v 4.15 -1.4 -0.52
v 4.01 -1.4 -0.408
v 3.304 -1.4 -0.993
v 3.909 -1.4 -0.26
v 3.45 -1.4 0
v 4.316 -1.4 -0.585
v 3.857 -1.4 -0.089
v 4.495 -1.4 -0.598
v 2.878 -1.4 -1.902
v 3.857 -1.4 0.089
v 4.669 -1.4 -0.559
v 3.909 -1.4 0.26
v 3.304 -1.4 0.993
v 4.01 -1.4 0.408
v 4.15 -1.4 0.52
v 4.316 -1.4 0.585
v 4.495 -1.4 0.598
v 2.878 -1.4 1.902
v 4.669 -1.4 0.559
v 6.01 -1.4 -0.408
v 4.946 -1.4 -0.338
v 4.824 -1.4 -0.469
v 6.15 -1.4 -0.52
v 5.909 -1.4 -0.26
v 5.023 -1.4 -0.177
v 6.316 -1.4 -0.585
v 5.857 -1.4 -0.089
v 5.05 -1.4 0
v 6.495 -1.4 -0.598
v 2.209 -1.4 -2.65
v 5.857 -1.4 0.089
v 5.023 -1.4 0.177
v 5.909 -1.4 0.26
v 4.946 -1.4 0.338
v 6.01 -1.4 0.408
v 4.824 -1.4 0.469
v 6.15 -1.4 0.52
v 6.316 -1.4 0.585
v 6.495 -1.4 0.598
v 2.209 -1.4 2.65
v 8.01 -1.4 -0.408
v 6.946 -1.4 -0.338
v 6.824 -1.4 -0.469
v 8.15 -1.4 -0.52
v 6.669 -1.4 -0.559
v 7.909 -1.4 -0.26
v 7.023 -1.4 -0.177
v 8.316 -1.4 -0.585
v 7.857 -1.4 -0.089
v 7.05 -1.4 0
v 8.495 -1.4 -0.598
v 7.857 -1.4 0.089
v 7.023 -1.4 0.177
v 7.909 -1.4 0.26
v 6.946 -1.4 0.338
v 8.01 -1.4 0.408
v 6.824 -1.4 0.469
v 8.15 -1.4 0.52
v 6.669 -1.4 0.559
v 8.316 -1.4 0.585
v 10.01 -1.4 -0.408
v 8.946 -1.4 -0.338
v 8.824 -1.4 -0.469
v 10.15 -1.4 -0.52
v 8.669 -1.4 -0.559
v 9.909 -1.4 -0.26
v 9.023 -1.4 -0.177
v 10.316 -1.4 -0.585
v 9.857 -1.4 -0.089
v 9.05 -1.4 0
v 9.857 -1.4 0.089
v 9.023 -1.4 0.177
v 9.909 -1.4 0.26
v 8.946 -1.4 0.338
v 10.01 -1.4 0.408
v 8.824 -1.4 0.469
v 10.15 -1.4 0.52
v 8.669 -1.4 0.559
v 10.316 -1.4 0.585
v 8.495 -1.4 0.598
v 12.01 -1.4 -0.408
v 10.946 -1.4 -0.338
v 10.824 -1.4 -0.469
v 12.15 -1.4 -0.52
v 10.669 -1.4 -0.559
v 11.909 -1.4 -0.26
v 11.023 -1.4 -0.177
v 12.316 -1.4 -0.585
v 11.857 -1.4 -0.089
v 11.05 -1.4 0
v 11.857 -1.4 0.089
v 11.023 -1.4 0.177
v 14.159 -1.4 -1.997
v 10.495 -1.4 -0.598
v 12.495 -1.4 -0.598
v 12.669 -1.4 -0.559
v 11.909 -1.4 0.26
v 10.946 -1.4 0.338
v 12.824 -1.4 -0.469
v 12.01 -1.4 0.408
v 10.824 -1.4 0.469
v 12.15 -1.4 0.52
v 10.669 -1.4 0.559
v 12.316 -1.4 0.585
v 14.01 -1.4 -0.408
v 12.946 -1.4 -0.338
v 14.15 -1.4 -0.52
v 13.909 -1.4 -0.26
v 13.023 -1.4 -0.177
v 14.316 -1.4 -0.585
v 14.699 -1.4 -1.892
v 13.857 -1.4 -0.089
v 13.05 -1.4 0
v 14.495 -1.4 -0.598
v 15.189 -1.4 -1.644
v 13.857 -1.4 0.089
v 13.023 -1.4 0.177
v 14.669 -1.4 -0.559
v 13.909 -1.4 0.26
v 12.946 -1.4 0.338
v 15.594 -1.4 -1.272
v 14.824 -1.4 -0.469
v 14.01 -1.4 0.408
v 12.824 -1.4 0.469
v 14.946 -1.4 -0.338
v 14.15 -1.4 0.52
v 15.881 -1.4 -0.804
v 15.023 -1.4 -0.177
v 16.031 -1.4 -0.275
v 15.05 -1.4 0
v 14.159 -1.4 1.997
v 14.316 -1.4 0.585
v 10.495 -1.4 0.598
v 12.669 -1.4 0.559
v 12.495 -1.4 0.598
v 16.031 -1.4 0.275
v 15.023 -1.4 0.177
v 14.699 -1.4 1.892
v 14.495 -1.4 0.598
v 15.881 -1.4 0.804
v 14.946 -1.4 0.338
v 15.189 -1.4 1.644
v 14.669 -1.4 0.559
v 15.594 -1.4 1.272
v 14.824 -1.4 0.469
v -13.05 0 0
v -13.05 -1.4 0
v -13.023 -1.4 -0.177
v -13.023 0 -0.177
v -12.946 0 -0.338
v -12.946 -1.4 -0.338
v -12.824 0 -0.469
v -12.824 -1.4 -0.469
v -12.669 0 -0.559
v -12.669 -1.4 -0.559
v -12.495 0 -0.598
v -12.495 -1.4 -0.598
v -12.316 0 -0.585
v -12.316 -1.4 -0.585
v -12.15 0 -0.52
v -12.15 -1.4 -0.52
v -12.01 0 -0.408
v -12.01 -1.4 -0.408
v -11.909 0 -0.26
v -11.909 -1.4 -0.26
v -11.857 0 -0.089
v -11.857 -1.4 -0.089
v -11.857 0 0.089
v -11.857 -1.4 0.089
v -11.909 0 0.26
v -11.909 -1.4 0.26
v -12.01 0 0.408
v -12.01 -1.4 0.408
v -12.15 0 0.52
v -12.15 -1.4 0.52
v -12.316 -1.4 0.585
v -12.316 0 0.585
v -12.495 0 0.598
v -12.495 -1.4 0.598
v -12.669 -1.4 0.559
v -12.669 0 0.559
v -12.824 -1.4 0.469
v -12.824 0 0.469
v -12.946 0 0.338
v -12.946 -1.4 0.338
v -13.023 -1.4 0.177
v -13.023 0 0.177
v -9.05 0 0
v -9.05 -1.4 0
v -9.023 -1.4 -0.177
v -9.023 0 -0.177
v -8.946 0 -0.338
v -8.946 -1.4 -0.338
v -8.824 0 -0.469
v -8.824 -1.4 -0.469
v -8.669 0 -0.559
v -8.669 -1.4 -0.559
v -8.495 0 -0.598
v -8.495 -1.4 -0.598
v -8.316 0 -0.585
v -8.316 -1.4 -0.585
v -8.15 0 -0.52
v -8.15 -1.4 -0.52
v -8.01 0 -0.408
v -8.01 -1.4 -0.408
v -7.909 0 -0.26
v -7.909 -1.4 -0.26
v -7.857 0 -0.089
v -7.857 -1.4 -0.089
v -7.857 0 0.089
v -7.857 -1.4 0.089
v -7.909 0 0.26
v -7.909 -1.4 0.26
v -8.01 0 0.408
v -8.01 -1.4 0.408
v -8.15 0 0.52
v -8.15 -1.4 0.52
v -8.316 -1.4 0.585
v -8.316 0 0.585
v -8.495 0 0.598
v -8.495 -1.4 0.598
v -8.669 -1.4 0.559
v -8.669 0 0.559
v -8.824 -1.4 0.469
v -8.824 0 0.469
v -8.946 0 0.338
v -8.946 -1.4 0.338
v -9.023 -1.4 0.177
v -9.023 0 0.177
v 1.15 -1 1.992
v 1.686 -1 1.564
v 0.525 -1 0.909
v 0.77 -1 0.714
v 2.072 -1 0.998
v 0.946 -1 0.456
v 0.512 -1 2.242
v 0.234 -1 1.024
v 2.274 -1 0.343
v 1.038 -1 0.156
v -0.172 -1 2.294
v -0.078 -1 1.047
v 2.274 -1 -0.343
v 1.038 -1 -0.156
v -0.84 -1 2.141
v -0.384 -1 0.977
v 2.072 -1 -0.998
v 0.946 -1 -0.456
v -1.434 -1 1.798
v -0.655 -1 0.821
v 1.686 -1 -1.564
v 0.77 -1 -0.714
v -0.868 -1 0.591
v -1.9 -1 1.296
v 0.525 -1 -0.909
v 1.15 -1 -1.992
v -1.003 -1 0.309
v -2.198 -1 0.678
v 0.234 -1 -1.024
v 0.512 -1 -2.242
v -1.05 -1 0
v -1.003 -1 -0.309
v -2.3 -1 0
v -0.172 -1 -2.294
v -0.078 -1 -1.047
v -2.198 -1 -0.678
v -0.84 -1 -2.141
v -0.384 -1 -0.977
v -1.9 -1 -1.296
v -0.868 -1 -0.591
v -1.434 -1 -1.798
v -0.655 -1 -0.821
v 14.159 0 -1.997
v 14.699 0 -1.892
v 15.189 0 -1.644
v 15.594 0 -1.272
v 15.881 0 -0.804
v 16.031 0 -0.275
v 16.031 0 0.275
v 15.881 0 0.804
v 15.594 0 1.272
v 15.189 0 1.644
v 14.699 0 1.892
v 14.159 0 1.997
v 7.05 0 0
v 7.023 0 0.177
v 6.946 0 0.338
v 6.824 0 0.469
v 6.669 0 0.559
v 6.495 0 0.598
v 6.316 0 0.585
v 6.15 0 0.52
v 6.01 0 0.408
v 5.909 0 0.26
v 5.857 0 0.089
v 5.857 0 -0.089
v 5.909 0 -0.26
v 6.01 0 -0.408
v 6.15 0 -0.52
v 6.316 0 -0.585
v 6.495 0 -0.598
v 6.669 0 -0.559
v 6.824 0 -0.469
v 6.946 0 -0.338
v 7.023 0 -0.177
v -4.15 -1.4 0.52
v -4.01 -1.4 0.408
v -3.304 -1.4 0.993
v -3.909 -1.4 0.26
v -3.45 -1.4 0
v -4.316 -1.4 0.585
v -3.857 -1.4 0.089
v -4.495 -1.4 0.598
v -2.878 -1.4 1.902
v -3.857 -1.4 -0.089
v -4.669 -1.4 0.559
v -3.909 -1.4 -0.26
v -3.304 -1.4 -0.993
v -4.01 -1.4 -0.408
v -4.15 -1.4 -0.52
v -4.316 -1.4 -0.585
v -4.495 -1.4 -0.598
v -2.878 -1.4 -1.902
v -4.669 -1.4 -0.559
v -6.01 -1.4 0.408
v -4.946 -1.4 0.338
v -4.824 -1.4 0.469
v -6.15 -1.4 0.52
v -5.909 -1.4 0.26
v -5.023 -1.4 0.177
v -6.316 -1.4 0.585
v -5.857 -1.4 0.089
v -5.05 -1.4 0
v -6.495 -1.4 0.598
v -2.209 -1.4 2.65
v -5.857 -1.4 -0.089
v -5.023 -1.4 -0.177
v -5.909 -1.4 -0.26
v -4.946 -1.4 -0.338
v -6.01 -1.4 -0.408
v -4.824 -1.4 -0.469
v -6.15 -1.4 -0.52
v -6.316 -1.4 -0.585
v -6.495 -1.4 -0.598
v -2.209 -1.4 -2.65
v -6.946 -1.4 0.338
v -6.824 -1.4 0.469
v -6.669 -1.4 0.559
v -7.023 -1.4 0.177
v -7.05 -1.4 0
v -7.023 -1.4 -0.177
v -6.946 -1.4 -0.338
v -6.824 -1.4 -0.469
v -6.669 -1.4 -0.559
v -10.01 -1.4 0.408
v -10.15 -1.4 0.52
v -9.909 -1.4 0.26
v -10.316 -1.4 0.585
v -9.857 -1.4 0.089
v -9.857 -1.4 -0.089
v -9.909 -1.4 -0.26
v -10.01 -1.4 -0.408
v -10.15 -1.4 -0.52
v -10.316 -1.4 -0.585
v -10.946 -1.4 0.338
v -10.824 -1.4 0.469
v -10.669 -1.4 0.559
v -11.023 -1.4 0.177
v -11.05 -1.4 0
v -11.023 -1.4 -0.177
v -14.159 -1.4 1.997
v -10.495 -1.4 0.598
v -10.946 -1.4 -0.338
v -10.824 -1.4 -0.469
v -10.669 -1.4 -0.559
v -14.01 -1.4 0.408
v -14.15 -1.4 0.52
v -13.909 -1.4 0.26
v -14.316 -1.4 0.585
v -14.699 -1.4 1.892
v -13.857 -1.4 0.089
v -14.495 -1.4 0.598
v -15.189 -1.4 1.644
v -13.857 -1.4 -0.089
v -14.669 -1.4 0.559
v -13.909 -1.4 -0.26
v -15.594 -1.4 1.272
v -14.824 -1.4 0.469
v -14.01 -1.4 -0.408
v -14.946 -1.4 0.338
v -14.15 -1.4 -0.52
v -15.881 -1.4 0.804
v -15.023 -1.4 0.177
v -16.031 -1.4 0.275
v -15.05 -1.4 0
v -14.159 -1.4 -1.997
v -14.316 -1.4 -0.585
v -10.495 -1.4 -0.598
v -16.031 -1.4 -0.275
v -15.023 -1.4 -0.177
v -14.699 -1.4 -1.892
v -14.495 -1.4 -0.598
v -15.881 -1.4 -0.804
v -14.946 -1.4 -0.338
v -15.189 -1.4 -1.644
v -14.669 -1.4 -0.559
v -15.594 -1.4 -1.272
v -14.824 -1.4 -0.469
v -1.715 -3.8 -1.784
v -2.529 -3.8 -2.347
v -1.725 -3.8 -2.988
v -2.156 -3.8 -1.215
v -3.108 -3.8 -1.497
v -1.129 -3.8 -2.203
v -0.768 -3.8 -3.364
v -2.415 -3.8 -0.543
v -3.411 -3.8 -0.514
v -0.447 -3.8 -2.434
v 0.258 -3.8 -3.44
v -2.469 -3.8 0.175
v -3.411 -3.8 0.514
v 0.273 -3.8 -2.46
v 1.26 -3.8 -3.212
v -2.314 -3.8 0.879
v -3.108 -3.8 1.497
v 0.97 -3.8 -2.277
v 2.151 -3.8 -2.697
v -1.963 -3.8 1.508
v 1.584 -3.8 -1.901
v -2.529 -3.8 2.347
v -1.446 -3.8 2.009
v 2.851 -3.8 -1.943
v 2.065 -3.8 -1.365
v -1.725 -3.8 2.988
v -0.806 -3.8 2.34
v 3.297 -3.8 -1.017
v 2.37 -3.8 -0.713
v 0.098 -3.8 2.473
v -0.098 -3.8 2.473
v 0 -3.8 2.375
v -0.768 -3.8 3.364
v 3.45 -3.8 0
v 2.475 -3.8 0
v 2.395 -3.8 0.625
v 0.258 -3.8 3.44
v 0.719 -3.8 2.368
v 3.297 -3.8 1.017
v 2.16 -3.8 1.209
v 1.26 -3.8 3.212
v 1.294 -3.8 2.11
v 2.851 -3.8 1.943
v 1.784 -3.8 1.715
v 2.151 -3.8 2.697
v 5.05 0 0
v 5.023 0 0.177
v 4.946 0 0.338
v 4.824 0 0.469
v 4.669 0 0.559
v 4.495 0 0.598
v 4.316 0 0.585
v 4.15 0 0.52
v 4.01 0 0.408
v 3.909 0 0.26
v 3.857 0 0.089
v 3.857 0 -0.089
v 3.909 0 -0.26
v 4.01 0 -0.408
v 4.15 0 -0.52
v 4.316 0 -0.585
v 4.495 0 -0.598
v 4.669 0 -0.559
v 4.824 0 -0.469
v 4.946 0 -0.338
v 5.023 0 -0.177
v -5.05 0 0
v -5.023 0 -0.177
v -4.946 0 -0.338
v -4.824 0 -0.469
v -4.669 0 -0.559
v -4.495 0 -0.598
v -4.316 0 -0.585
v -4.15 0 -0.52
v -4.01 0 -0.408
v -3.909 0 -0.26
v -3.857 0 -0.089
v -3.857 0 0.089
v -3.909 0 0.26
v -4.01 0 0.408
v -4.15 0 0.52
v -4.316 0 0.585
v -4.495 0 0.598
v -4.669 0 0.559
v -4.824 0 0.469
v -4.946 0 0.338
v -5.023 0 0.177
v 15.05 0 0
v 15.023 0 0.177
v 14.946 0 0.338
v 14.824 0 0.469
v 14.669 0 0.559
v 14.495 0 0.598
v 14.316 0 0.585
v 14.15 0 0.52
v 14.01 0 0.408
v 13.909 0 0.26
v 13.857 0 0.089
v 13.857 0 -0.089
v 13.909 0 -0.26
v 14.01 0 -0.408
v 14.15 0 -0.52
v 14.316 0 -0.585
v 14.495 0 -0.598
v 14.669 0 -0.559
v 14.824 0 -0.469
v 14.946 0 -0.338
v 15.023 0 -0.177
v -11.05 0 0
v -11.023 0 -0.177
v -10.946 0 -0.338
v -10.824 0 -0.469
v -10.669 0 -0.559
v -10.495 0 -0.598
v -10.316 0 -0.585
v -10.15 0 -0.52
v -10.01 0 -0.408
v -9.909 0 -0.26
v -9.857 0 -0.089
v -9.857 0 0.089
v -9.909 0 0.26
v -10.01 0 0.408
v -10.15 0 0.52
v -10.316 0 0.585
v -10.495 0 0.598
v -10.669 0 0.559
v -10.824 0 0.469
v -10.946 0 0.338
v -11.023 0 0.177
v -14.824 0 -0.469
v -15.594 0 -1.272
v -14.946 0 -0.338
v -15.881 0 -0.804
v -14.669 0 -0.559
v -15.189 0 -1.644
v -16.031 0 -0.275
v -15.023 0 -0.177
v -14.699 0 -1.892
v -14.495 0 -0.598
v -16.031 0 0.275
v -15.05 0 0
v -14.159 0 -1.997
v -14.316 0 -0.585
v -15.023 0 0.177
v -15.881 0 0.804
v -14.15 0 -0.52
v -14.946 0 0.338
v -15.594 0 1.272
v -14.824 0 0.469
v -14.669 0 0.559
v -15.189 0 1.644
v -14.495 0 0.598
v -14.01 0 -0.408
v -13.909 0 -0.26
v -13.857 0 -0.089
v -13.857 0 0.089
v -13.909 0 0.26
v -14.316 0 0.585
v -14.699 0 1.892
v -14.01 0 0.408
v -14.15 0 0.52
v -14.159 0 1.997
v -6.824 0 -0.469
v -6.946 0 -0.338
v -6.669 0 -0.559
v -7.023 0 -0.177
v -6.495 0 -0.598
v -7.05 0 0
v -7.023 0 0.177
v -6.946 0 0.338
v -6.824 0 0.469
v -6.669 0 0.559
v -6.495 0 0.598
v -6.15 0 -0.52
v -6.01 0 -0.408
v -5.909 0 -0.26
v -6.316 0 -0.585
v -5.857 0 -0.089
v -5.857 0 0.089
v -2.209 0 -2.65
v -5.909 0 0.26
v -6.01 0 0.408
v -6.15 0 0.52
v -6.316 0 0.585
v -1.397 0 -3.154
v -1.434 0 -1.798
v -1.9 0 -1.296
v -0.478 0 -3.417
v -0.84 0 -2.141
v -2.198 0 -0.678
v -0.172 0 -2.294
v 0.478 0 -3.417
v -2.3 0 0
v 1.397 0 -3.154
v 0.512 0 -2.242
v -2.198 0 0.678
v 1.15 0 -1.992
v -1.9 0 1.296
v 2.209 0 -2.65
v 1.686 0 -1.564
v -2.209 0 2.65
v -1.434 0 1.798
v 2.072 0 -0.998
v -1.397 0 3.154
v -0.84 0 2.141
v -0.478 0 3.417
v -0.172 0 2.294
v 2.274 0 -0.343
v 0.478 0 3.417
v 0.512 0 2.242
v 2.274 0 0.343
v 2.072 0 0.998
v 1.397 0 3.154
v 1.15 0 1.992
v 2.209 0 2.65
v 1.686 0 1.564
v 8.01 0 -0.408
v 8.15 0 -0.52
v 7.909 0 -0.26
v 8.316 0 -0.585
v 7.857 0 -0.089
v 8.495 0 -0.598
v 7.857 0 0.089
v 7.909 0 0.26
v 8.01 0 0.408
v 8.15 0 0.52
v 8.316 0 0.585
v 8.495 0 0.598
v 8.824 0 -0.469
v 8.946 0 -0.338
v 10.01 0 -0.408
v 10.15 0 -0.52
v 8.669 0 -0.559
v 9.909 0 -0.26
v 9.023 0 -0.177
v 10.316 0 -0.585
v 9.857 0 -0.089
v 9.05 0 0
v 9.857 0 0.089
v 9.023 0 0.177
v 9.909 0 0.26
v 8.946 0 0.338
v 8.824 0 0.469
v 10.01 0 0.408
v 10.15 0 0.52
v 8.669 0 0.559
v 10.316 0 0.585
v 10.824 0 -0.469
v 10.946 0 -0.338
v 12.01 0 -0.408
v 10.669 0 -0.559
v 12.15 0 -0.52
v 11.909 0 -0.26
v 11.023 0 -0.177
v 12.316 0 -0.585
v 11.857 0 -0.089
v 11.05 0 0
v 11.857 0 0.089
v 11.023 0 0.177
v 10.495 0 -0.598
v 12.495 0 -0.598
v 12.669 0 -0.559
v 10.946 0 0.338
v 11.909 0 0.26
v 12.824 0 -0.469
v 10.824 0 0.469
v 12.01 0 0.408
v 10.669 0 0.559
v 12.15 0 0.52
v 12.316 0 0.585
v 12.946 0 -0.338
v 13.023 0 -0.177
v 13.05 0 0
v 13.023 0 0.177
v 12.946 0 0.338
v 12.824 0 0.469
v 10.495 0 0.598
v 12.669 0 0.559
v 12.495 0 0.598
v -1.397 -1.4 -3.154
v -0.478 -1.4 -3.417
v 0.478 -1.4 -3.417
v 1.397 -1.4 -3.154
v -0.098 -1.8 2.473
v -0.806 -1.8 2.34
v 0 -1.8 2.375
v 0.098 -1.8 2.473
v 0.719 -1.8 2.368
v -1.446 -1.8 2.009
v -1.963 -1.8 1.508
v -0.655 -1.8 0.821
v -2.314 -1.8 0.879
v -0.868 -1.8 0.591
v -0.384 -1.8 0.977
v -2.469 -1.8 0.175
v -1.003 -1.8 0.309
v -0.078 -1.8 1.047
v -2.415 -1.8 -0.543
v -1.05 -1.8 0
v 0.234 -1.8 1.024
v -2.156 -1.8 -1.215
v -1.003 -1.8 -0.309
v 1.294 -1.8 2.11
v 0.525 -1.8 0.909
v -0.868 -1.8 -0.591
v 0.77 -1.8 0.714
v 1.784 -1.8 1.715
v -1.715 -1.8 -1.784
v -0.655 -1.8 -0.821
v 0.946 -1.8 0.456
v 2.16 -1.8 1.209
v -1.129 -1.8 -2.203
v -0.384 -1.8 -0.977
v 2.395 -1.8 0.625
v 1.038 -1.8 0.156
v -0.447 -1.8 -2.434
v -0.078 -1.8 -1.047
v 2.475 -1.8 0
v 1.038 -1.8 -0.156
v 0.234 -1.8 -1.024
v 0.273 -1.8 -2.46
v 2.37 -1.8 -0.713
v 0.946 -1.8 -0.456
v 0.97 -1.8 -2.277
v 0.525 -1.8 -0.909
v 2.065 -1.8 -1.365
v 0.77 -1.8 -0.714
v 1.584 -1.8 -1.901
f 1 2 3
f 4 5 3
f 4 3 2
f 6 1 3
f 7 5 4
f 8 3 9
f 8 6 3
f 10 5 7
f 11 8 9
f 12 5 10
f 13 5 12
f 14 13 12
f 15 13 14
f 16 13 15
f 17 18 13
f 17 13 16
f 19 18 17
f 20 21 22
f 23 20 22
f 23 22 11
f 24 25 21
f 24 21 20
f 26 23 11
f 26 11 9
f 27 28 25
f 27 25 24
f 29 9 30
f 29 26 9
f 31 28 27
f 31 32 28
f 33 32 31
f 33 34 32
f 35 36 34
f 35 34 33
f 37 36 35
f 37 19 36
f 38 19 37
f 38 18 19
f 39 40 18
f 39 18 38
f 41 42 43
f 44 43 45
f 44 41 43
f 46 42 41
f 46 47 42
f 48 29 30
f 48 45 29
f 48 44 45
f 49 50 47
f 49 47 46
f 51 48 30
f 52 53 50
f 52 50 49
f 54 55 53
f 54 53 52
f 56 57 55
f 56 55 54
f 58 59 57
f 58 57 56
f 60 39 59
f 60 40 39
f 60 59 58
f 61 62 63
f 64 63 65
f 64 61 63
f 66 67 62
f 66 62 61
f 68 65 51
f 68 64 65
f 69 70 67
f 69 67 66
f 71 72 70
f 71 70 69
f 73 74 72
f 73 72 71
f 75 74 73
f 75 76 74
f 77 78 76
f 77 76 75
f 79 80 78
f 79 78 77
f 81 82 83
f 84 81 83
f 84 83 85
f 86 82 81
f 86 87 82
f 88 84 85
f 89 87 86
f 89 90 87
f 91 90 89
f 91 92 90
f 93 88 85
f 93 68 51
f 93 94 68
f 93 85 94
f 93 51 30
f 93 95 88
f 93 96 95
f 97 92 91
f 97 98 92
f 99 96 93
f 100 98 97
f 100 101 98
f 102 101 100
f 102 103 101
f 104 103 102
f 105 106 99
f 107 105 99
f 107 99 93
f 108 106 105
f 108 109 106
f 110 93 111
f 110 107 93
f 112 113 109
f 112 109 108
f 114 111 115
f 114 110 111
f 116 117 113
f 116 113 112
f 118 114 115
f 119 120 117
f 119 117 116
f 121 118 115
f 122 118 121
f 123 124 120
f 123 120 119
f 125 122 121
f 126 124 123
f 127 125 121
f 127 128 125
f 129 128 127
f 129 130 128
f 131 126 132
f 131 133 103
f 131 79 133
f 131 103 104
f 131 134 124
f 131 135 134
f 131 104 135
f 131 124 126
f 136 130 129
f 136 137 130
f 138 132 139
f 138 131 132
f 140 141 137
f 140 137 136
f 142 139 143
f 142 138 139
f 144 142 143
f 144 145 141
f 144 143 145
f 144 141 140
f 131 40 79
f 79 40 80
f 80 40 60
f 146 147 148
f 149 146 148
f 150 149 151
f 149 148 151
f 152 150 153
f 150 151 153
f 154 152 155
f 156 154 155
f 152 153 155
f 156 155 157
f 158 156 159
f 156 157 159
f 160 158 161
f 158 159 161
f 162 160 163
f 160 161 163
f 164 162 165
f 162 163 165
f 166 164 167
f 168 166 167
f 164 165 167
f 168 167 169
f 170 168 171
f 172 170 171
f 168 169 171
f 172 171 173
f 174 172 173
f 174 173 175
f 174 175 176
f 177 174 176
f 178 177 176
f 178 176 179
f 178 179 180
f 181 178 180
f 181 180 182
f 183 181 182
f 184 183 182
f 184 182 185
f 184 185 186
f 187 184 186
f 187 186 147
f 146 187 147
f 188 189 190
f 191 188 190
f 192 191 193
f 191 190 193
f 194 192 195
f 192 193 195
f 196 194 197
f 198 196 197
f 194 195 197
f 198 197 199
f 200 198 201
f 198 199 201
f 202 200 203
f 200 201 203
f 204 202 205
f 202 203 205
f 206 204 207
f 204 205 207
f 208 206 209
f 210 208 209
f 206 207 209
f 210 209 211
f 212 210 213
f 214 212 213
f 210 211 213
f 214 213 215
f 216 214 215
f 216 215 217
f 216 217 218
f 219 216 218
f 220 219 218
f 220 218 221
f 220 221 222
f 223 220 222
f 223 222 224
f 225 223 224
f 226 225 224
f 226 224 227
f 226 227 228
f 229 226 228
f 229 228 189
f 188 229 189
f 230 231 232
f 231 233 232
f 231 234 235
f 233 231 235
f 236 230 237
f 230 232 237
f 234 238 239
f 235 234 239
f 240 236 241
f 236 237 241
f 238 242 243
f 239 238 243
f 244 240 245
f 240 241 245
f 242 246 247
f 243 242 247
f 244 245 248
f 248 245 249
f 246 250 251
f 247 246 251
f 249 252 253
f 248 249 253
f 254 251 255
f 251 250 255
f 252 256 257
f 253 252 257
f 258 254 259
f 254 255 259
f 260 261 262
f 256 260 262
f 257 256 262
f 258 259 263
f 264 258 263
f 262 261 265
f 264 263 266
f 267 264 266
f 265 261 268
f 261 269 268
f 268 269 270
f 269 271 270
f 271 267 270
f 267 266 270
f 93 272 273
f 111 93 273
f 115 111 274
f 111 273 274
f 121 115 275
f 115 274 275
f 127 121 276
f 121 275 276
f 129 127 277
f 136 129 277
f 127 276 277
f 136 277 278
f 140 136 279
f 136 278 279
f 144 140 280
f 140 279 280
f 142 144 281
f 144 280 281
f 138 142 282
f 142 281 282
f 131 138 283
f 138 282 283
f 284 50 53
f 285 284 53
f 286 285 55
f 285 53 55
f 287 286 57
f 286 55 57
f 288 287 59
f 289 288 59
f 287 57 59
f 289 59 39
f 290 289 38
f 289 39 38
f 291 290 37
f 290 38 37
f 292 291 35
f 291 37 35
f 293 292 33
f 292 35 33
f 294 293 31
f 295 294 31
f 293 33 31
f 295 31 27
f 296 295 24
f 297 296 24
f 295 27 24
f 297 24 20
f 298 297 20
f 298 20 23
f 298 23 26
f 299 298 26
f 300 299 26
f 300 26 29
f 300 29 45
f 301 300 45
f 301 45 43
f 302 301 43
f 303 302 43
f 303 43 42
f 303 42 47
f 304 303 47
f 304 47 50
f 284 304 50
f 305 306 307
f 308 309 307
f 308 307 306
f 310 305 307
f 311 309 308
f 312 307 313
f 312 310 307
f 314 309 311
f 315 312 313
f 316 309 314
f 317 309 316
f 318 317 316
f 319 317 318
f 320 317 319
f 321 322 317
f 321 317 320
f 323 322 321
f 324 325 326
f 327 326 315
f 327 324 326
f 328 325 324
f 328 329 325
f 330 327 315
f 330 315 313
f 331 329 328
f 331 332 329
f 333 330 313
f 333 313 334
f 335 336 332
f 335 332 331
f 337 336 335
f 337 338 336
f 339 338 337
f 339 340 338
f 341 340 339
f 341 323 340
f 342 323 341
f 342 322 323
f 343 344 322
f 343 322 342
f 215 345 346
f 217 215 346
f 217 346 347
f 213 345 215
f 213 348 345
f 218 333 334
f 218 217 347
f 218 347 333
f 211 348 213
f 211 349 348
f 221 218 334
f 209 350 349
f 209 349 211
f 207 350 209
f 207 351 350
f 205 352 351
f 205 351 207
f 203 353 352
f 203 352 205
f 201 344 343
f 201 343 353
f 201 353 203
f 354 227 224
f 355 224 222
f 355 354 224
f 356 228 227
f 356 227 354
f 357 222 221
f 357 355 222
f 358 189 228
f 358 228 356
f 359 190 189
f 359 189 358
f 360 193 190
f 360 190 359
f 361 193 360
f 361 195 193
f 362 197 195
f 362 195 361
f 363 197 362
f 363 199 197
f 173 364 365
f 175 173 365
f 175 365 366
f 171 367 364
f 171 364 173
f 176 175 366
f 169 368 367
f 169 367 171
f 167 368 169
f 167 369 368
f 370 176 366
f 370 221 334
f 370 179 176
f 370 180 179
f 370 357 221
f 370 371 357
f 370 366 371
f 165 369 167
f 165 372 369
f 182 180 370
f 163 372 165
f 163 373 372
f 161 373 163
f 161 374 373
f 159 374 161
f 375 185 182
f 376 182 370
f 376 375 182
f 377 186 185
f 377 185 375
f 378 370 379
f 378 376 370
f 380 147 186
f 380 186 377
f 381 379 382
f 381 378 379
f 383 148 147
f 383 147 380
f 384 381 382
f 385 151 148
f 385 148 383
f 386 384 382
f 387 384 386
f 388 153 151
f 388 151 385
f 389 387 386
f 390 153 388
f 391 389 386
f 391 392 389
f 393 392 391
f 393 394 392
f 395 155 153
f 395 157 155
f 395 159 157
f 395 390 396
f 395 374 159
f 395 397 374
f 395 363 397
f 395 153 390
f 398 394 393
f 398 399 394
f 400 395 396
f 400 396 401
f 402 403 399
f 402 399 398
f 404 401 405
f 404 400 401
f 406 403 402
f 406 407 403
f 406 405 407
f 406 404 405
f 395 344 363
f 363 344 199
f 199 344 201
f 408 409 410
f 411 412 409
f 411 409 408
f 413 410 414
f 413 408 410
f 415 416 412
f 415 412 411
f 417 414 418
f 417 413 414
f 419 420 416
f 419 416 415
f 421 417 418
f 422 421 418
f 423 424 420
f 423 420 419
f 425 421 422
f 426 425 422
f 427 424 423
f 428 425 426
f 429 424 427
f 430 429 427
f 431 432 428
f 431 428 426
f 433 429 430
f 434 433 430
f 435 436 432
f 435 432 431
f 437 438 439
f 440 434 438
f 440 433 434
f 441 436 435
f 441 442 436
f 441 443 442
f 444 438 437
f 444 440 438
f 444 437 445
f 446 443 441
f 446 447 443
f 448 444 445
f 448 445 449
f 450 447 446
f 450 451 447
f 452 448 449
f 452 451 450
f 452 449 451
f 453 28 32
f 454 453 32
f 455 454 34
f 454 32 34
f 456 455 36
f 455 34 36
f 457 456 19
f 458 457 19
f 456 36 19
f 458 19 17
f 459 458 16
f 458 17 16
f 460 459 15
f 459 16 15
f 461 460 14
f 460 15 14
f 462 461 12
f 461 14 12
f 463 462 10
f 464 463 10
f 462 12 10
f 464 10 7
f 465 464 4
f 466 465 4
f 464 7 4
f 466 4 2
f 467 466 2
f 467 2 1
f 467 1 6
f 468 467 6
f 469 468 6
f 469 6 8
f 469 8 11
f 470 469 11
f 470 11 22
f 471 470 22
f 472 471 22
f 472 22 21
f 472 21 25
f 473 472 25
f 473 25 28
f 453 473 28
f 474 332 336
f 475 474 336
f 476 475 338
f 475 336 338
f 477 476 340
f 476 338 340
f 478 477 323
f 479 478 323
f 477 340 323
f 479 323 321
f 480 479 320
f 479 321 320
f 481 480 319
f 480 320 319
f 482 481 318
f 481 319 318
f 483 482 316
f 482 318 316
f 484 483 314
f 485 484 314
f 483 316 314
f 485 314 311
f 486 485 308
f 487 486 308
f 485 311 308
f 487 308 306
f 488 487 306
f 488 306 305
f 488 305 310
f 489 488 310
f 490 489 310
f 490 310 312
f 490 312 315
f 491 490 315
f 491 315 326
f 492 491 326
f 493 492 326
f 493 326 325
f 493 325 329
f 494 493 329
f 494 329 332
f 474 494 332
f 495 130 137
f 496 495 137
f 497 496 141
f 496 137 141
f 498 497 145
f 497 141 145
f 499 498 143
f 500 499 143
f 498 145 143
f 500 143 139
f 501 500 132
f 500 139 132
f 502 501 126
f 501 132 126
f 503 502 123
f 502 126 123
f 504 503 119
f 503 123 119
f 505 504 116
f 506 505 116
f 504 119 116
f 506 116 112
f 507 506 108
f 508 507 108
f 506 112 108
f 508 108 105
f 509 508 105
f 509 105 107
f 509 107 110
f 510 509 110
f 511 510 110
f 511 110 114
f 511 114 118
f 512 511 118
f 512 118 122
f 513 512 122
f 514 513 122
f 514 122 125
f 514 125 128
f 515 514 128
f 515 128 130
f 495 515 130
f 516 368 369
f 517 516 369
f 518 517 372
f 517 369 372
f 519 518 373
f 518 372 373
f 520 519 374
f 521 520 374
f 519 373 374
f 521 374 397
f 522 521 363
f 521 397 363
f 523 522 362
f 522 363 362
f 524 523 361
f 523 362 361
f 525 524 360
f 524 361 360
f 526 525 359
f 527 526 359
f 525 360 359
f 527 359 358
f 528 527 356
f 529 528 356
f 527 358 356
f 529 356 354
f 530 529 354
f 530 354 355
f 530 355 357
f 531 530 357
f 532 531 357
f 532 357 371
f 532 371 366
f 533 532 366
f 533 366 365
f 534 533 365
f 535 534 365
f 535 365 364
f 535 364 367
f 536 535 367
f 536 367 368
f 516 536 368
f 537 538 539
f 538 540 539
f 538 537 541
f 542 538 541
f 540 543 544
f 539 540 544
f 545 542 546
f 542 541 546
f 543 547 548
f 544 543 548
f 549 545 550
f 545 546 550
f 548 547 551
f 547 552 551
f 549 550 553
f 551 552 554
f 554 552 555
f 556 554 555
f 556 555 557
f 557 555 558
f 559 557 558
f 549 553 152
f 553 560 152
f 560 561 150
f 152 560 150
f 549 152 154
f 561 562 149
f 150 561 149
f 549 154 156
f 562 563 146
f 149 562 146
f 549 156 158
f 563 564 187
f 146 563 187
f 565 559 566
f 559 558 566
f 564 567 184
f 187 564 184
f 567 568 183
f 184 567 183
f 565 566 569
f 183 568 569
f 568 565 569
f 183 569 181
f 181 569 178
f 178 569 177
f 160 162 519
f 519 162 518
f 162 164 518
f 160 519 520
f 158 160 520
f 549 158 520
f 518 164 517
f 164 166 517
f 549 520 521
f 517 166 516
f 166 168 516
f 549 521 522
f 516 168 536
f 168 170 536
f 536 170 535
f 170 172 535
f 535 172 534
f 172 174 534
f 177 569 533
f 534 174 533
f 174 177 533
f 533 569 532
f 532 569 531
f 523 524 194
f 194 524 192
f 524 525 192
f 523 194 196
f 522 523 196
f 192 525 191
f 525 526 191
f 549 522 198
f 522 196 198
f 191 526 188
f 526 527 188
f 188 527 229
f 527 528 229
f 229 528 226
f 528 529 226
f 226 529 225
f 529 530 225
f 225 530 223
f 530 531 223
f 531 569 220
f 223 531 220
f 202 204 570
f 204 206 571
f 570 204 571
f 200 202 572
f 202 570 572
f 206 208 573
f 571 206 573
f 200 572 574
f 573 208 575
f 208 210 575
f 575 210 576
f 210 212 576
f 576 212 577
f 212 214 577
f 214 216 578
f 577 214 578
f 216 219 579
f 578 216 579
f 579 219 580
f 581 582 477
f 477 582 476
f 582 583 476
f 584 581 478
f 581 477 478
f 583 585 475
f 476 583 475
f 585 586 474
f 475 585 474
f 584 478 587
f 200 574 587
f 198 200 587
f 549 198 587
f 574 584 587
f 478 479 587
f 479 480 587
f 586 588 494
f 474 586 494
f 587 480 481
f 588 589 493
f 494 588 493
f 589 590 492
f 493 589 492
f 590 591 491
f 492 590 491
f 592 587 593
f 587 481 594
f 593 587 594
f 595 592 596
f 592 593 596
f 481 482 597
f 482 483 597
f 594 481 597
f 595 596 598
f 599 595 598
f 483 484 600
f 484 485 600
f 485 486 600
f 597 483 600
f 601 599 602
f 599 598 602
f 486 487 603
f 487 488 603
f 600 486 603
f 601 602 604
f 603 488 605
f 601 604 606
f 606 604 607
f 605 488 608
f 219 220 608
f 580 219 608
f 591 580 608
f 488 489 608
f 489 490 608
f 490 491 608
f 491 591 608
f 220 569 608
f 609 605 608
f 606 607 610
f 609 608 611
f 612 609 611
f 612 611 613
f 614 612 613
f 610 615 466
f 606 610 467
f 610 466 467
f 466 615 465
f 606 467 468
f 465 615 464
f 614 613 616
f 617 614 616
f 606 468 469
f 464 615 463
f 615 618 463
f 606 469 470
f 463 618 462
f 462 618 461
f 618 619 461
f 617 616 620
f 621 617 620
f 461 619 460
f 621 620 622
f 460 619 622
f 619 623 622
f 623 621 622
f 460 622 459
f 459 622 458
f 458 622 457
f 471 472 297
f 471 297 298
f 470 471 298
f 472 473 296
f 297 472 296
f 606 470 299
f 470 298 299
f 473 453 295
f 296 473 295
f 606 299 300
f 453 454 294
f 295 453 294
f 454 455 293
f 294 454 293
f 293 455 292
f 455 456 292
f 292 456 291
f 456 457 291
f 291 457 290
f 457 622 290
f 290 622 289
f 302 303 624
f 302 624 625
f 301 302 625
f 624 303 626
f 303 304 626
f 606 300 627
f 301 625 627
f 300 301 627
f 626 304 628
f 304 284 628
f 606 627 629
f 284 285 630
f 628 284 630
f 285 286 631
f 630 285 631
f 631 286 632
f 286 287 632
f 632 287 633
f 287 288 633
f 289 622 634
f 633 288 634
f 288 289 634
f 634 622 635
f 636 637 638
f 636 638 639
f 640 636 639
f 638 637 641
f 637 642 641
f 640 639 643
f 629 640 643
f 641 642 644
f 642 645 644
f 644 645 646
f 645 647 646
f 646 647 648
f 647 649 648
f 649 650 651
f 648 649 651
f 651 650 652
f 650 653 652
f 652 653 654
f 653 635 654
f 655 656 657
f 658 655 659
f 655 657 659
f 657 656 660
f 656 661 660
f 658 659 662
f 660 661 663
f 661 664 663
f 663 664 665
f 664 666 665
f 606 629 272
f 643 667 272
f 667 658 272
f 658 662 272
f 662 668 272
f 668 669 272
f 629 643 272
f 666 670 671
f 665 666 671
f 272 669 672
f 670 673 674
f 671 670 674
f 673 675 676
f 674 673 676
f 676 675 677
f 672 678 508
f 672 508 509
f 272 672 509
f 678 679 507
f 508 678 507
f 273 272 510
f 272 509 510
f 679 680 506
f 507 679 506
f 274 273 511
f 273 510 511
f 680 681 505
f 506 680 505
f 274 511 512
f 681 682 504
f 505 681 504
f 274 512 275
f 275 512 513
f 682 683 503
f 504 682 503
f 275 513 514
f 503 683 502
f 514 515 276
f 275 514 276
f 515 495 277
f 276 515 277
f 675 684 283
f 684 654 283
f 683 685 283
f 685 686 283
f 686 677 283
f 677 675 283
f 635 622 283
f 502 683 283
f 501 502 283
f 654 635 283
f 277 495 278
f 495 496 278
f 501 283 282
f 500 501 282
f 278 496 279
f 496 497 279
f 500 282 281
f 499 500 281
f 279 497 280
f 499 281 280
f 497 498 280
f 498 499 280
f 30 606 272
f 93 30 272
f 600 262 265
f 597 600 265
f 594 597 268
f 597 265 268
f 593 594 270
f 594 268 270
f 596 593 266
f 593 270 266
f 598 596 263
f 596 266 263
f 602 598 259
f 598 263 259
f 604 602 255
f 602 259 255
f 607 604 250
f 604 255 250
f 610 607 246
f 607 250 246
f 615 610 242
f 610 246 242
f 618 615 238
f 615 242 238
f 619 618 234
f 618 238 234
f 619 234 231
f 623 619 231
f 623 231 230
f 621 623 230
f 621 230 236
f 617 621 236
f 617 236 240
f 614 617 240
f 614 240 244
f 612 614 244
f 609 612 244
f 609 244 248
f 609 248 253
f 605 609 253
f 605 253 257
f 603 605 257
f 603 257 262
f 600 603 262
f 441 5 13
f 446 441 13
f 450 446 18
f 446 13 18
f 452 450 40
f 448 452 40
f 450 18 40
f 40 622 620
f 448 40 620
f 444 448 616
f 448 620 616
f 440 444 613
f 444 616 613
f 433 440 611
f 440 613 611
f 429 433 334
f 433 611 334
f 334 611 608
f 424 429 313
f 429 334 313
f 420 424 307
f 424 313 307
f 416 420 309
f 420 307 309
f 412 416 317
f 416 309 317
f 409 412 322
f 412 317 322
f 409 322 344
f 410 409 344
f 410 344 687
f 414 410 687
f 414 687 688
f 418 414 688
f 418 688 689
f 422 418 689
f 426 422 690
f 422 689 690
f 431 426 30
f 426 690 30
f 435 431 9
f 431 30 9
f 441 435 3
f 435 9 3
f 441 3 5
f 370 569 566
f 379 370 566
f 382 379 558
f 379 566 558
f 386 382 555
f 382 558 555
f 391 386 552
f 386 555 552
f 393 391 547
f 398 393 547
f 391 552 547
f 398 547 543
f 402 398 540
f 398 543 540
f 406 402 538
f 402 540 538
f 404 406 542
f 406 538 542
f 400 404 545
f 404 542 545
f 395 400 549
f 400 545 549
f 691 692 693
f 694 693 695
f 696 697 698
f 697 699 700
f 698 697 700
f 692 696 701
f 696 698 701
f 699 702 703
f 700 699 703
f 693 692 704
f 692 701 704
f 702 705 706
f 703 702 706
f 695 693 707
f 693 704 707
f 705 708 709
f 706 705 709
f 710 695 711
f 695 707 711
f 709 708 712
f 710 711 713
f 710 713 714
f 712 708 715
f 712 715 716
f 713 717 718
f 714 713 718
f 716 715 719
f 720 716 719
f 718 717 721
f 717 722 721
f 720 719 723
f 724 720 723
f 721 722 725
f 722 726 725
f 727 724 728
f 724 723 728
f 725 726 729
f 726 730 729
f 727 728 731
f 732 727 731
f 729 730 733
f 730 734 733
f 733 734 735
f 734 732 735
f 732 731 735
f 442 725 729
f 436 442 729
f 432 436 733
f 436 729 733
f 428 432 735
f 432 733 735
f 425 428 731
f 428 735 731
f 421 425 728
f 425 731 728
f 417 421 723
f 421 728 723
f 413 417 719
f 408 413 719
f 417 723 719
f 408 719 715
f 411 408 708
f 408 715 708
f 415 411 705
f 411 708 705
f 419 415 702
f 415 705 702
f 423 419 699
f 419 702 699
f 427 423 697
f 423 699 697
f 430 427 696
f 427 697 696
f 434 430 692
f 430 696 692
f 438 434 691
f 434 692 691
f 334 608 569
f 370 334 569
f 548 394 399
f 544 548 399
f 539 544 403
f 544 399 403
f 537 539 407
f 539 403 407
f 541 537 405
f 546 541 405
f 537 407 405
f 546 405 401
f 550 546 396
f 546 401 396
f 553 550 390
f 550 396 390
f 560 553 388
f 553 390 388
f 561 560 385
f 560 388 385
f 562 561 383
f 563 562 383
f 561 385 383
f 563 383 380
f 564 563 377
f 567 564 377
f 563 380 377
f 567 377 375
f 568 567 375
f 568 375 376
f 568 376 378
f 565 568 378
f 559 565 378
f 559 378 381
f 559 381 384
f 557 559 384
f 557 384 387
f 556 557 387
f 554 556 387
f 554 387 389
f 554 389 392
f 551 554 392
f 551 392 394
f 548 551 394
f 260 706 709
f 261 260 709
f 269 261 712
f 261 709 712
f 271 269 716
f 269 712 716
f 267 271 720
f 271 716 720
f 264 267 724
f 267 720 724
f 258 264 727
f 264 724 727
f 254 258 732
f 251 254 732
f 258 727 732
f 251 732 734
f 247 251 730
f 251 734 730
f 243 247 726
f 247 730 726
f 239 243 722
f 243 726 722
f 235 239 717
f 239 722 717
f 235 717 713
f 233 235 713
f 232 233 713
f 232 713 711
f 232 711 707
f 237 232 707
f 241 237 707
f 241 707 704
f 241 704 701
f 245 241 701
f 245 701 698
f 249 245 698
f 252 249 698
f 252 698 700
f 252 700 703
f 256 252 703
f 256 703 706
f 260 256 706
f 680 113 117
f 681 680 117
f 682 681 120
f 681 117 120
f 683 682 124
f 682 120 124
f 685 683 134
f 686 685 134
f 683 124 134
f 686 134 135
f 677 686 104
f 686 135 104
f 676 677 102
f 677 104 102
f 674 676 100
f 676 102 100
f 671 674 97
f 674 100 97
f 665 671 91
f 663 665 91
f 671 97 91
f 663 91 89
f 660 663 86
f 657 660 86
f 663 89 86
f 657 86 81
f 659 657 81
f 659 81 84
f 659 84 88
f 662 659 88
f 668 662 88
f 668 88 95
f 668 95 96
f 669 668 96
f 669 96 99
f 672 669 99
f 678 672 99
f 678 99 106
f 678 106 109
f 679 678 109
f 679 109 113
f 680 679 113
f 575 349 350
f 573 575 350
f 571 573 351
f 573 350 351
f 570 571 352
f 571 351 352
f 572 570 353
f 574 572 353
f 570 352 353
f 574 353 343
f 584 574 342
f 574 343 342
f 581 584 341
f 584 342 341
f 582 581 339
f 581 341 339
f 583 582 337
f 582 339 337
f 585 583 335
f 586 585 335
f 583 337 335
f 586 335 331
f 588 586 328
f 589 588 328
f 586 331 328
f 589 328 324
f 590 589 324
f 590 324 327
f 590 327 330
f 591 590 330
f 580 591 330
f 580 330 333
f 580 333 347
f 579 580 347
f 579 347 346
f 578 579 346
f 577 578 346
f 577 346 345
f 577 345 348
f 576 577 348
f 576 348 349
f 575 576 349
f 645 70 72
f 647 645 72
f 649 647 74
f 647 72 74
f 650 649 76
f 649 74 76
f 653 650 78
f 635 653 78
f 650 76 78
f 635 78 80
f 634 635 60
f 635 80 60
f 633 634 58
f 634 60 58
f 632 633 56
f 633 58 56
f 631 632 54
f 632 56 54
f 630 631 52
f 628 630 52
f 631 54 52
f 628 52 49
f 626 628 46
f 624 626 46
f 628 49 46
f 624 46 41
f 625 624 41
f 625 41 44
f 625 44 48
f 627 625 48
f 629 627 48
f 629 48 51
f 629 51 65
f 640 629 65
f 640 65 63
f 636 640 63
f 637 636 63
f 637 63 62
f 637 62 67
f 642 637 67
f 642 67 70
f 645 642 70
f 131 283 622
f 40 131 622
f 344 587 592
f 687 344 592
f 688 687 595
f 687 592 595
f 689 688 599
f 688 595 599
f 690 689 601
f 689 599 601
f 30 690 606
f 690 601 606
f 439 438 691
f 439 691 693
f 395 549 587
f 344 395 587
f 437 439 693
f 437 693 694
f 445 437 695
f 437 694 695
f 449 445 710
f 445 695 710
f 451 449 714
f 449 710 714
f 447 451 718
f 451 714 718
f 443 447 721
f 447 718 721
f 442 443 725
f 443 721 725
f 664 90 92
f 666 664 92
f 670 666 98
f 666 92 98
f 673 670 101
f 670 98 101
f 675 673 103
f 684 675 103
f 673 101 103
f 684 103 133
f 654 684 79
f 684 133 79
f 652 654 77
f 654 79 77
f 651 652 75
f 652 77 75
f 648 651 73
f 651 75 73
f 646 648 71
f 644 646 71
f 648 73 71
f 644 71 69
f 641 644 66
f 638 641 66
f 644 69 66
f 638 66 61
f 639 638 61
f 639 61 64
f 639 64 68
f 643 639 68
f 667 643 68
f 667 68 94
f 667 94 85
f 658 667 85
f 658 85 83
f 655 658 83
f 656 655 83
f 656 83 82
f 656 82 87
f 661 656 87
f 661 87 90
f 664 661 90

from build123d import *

# Parameters (mm, degrees)
RESSALTO_EXTRUS_O1_DEPTH = 1.4
ESBO_O2_R                = 3.45
RESSALTO_EXTRUS_O2_DEPTH = 2.4
FURO4_D                  = 1.2
PADR_O_LINEAR1_COUNT     = 6
PADR_O_LINEAR1_PITCH     = 2
PADR_OCIRCULAR2_COUNT    = 2
PADR_OCIRCULAR2_COPY_1_D = 1.2
PADR_OCIRCULAR2_COPY_2_D = 1.2
PADR_OCIRCULAR2_COPY_3_D = 1.2
PADR_OCIRCULAR2_COPY_4_D = 1.2
PADR_OCIRCULAR2_COPY_5_D = 1.2
FURO1_D                  = 4.95
FURO1_DEPTH              = 2
FURO2_D                  = 4.6
FURO2_DEPTH              = 1
FURO3_D                  = 2.1
RESSALTO_EXTRUS_O3_DEPTH = 2


with BuildPart() as part:
    # Esboço1 → Ressalto-extrusão1 (new body)
    with BuildSketch(Plane(origin=(0, 0, 0), x_dir=(1, 0, 0), z_dir=(0, 1, 0))):
        with BuildLine():
            Line((-14.159121967, 1.99702088), (-2.209072203, 2.65))
            ThreePointArc((-2.209072203, 2.65), (3.45, 0), (-2.209072203, -2.65))
            Line((-2.209072203, -2.65), (-14.159121967, -1.99702088))
            ThreePointArc((-14.159121967, -1.99702088), (-16.05, 0), (-14.159121967, 1.99702088))
        make_face()
    ressalto_extrus_o1 = extrude(amount=-RESSALTO_EXTRUS_O1_DEPTH)

    # Esboço2 → Ressalto-extrusão2 (add)
    with BuildSketch(Plane.XZ.offset(1.4)):
        Circle(ESBO_O2_R)
    extrude(amount=RESSALTO_EXTRUS_O2_DEPTH)

    # Furo4 (through all)
    with Locations(Plane(origin=(0, 0, 0), x_dir=(1, 0, 0), z_dir=(0, 1, 0))):
        with Locations((-14.45, 0)):
            furo4 = Hole(FURO4_D / 2)

    # Padrão linear1: Furo4 ×6
    with Locations(*[(i * PADR_O_LINEAR1_PITCH, 0, 0) for i in range(1, PADR_O_LINEAR1_COUNT)]):
        add(furo4, mode=Mode.SUBTRACT)

    # PadrãoCircular2: Ressalto-extrusão1, Furo4 ×2 about axis
    padr_ocircular2_axis = Axis((0, 0, 0), (0, 1, 0))
    for i in range(1, PADR_OCIRCULAR2_COUNT):
        add(ressalto_extrus_o1.rotate(padr_ocircular2_axis, i * 360 / PADR_OCIRCULAR2_COUNT))
        add(furo4.rotate(padr_ocircular2_axis, i * 360 / PADR_OCIRCULAR2_COUNT), mode=Mode.SUBTRACT)

    # PadrãoCircular2 copy 1 (through all)
    with Locations(Plane(origin=(-2, 0, 0), x_dir=(-1, 0, 0), z_dir=(0, 1, 0))):
        with Locations((-14.45, 0)):
            Hole(PADR_OCIRCULAR2_COPY_1_D / 2)

    # PadrãoCircular2 copy 2 (through all)
    with Locations(Plane(origin=(-4, 0, 0), x_dir=(-1, 0, 0), z_dir=(0, 1, 0))):
        with Locations((-14.45, 0)):
            Hole(PADR_OCIRCULAR2_COPY_2_D / 2)

    # PadrãoCircular2 copy 3 (through all)
    with Locations(Plane(origin=(-6, 0, 0), x_dir=(-1, 0, 0), z_dir=(0, 1, 0))):
        with Locations((-14.45, 0)):
            Hole(PADR_OCIRCULAR2_COPY_3_D / 2)

    # PadrãoCircular2 copy 4 (through all)
    with Locations(Plane(origin=(-8, 0, 0), x_dir=(-1, 0, 0), z_dir=(0, 1, 0))):
        with Locations((-14.45, 0)):
            Hole(PADR_OCIRCULAR2_COPY_4_D / 2)

    # PadrãoCircular2 copy 5 (through all)
    with Locations(Plane(origin=(-10, 0, 0), x_dir=(-1, 0, 0), z_dir=(0, 1, 0))):
        with Locations((-14.45, 0)):
            Hole(PADR_OCIRCULAR2_COPY_5_D / 2)

    # Furo1
    with Locations(Plane(origin=(0, -3.8, 0), x_dir=(-1, 0, 0), z_dir=(0, -1, 0))):
        with Locations((0, 0)):
            Hole(FURO1_D / 2, depth=FURO1_DEPTH)

    # Furo2
    with Locations(Plane(origin=(0, 0, 0), x_dir=(1, 0, 0), z_dir=(0, 1, 0))):
        with Locations((0, 0)):
            Hole(FURO2_D / 2, depth=FURO2_DEPTH)

    # Furo3 (through all)
    with Locations(Plane(origin=(0, 0, 0), x_dir=(1, 0, 0), z_dir=(0, 1, 0))):
        with Locations((0, 0)):
            Hole(FURO3_D / 2)

    # Esboço11 → Ressalto-extrusão3 (add)
    with BuildSketch(Plane.XZ.offset(3.8)):
        with BuildLine():
            Line((-0.098056786, 2.473056786), (0, 2.375))
            Line((0, 2.375), (0.098056786, 2.473056786))
            ThreePointArc((0.098056786, 2.473056786), (0, 2.475), (-0.098056786, 2.473056786))
        make_face()
    extrude(amount=-RESSALTO_EXTRUS_O3_DEPTH)


solid = part.part
